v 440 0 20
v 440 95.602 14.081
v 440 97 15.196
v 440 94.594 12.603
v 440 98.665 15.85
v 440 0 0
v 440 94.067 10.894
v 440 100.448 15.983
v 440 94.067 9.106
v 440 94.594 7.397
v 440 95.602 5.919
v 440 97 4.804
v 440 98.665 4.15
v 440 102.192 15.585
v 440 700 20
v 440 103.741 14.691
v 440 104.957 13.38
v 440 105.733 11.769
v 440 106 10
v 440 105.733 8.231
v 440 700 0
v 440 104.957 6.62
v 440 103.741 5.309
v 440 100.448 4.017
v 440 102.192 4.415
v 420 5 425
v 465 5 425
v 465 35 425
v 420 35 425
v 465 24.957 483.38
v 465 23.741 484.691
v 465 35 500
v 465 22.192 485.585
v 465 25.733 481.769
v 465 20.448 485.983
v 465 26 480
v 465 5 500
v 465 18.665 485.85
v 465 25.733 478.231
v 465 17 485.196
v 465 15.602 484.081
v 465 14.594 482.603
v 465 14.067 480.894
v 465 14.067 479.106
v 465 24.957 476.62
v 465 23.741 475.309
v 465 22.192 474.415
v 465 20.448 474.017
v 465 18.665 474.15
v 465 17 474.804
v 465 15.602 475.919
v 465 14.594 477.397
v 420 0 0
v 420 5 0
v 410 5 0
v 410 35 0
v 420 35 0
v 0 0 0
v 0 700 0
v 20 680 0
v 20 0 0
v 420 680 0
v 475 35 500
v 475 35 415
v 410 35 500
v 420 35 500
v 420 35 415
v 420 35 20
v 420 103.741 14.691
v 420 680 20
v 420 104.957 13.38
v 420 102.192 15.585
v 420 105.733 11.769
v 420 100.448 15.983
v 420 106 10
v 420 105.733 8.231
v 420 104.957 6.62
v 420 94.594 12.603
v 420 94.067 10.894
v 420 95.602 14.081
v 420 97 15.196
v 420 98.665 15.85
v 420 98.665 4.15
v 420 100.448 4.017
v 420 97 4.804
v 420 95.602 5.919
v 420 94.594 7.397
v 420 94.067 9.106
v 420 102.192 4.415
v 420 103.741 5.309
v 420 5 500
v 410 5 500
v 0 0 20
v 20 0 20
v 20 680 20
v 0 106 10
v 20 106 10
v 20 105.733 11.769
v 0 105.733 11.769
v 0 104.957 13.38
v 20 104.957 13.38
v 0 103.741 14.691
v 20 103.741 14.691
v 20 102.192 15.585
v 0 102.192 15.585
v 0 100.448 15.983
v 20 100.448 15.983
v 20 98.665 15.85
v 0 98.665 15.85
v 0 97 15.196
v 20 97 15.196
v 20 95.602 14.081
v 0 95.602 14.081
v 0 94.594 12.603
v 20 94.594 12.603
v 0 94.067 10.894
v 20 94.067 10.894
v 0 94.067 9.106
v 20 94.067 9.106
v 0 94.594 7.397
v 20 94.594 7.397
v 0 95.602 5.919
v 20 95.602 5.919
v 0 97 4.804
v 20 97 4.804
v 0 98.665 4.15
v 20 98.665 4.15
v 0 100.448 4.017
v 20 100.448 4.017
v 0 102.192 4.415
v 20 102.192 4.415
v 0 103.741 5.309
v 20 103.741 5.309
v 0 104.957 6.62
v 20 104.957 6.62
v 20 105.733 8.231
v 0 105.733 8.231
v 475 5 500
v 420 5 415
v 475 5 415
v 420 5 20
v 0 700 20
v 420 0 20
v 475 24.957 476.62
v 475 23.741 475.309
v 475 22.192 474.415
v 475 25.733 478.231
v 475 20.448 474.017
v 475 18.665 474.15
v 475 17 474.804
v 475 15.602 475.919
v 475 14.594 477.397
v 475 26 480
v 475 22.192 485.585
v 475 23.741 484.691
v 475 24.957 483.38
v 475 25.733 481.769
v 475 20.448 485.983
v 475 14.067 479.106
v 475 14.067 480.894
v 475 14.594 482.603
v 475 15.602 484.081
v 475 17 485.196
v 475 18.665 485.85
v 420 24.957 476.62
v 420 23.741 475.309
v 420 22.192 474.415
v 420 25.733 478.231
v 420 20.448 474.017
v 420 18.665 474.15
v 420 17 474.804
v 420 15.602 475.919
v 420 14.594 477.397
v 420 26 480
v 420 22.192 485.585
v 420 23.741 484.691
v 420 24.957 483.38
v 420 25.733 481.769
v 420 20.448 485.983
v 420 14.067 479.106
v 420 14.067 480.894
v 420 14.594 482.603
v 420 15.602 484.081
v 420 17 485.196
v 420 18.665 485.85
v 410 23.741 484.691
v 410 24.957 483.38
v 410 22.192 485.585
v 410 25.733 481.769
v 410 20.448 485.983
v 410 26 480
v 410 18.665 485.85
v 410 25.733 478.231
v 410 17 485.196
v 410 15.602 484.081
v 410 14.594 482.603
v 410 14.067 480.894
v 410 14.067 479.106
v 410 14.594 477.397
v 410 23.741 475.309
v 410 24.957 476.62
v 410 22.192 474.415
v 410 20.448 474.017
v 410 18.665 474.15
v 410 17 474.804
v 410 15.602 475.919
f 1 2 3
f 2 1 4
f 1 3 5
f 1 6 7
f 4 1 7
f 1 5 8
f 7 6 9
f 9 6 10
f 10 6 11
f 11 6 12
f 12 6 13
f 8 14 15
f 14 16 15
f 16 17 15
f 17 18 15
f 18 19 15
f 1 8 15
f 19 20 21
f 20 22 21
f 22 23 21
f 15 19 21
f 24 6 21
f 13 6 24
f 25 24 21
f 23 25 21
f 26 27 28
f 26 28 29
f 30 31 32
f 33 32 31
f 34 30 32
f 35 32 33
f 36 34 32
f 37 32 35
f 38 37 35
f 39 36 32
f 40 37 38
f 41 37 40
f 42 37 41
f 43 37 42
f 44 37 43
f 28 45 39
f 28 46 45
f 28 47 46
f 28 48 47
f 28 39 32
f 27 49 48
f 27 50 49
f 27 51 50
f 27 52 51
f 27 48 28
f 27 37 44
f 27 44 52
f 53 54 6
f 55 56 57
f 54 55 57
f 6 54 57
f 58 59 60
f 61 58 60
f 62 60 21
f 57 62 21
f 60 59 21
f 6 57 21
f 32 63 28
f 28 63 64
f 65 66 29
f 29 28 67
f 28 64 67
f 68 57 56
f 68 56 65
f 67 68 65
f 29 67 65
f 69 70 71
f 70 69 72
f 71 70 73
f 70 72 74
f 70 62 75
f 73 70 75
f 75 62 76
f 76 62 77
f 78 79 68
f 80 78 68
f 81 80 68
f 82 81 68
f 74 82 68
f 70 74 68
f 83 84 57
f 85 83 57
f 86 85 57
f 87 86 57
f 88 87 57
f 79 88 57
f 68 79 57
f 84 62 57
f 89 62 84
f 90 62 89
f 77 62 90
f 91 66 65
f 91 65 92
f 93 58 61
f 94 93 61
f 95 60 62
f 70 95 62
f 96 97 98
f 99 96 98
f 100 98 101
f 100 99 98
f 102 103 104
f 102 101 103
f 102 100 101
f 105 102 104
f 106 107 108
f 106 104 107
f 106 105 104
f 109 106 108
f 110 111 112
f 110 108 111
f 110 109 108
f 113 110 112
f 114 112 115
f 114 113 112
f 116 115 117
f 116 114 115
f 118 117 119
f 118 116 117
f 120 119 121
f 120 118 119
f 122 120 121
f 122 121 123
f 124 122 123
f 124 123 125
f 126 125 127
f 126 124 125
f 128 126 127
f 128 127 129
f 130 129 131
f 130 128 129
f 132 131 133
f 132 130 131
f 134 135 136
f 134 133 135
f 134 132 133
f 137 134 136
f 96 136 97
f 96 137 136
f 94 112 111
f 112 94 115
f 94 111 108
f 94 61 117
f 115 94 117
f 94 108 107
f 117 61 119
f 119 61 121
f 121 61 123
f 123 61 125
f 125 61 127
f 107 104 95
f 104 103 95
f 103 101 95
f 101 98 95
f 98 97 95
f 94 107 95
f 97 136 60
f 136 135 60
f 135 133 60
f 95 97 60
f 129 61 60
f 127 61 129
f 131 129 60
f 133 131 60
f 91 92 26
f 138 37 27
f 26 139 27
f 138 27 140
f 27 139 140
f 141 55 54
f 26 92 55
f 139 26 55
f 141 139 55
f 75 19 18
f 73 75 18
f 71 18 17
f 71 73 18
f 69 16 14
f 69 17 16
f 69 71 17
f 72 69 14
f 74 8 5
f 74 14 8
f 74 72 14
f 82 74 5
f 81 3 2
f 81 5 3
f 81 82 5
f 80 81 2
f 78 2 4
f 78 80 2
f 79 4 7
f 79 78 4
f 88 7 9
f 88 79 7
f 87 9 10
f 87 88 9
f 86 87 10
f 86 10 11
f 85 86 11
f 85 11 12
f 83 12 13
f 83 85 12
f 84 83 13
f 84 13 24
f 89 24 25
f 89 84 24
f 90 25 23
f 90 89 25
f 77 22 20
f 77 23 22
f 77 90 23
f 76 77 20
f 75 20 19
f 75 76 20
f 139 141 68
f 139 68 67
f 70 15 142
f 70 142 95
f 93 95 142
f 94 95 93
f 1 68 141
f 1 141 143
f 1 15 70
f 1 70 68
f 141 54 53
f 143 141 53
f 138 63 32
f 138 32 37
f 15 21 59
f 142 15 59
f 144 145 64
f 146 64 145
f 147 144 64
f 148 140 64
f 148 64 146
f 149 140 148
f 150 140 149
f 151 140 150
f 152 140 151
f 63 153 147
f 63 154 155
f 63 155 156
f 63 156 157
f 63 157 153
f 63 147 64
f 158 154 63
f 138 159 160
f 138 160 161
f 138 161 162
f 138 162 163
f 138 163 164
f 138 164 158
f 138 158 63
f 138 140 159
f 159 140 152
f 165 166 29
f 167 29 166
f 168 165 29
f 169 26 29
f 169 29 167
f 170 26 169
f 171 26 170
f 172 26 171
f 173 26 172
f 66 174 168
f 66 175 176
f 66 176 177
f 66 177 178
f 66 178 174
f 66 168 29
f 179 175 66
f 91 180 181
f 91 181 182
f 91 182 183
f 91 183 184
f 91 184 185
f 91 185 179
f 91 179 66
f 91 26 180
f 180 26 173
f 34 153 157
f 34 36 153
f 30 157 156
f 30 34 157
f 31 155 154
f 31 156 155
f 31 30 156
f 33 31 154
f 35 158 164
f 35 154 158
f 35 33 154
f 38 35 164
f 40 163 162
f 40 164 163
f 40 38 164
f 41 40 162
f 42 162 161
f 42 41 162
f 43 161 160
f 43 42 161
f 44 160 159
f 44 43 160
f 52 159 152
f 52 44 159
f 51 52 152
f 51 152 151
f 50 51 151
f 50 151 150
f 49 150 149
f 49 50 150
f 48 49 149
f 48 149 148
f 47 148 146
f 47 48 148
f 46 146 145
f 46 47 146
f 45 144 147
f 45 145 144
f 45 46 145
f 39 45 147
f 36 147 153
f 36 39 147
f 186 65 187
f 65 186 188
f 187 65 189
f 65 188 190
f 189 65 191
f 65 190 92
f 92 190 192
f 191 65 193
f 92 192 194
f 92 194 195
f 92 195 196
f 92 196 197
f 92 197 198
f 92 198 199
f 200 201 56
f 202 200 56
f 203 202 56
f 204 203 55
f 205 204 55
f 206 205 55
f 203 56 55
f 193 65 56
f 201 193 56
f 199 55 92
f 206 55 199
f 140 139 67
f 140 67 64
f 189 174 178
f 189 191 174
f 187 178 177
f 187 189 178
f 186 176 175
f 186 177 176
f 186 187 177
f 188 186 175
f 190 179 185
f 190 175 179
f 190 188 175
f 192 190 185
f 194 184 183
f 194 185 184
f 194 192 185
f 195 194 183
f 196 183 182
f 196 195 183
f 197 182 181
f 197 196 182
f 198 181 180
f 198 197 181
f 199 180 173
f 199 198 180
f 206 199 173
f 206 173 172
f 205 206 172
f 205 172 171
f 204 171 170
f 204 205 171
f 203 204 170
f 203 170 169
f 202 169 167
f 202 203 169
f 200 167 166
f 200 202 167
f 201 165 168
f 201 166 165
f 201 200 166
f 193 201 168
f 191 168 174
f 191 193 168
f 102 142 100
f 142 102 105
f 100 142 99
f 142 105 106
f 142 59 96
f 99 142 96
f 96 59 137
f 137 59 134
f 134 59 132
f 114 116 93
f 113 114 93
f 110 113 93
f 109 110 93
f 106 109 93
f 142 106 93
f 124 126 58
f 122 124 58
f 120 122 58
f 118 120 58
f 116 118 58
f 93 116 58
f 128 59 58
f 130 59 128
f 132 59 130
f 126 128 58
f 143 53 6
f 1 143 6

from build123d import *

# Parameters (mm, degrees)
F2_DEPTH = 926
F0_R     = 6
F3_DEPTH = 594
F5_DEPTH = 769


with BuildPart() as f2:
    # F1 (on Top) → F2 (new body)
    with BuildSketch(Plane.XY):
        Polygon((0, 700), (0, 0), (20, 0), (20, 680), (420, 680), (420, 35), (410, 35), (410, 5), (420, 5), (420, 0), (440, 0), (440, 5), (520.748317, 5), (520.748317, 35), (440, 35), (440, 700), align=None)
    extrude(amount=F2_DEPTH)

    # F0 (on Right) → F3 (intersect, symmetric)
    with BuildSketch(Plane.YZ):
        Polygon((0, 20), (0, 0), (800, 0), (800, 20), (35, 20), (35, 500), (5, 500), (5, 20), align=None)
        with Locations((100, 10)):
            Circle(F0_R, mode=Mode.SUBTRACT)
        with Locations((20, 480)):
            Circle(F0_R, mode=Mode.SUBTRACT)
    extrude(amount=F3_DEPTH, both=True, mode=Mode.INTERSECT)

    # F4 (on Front) → F5 (intersect)
    with BuildSketch(Plane.XZ):
        Polygon((0, 20), (0, 0), (440, 0), (440, 20), (420, 20), (420, 415), (475, 415), (475, 520), (465, 520), (465, 425), (420, 425), (420, 520), (410, 520), (410, 20), align=None)
    extrude(amount=-F5_DEPTH, mode=Mode.INTERSECT)


solid = f2.part
